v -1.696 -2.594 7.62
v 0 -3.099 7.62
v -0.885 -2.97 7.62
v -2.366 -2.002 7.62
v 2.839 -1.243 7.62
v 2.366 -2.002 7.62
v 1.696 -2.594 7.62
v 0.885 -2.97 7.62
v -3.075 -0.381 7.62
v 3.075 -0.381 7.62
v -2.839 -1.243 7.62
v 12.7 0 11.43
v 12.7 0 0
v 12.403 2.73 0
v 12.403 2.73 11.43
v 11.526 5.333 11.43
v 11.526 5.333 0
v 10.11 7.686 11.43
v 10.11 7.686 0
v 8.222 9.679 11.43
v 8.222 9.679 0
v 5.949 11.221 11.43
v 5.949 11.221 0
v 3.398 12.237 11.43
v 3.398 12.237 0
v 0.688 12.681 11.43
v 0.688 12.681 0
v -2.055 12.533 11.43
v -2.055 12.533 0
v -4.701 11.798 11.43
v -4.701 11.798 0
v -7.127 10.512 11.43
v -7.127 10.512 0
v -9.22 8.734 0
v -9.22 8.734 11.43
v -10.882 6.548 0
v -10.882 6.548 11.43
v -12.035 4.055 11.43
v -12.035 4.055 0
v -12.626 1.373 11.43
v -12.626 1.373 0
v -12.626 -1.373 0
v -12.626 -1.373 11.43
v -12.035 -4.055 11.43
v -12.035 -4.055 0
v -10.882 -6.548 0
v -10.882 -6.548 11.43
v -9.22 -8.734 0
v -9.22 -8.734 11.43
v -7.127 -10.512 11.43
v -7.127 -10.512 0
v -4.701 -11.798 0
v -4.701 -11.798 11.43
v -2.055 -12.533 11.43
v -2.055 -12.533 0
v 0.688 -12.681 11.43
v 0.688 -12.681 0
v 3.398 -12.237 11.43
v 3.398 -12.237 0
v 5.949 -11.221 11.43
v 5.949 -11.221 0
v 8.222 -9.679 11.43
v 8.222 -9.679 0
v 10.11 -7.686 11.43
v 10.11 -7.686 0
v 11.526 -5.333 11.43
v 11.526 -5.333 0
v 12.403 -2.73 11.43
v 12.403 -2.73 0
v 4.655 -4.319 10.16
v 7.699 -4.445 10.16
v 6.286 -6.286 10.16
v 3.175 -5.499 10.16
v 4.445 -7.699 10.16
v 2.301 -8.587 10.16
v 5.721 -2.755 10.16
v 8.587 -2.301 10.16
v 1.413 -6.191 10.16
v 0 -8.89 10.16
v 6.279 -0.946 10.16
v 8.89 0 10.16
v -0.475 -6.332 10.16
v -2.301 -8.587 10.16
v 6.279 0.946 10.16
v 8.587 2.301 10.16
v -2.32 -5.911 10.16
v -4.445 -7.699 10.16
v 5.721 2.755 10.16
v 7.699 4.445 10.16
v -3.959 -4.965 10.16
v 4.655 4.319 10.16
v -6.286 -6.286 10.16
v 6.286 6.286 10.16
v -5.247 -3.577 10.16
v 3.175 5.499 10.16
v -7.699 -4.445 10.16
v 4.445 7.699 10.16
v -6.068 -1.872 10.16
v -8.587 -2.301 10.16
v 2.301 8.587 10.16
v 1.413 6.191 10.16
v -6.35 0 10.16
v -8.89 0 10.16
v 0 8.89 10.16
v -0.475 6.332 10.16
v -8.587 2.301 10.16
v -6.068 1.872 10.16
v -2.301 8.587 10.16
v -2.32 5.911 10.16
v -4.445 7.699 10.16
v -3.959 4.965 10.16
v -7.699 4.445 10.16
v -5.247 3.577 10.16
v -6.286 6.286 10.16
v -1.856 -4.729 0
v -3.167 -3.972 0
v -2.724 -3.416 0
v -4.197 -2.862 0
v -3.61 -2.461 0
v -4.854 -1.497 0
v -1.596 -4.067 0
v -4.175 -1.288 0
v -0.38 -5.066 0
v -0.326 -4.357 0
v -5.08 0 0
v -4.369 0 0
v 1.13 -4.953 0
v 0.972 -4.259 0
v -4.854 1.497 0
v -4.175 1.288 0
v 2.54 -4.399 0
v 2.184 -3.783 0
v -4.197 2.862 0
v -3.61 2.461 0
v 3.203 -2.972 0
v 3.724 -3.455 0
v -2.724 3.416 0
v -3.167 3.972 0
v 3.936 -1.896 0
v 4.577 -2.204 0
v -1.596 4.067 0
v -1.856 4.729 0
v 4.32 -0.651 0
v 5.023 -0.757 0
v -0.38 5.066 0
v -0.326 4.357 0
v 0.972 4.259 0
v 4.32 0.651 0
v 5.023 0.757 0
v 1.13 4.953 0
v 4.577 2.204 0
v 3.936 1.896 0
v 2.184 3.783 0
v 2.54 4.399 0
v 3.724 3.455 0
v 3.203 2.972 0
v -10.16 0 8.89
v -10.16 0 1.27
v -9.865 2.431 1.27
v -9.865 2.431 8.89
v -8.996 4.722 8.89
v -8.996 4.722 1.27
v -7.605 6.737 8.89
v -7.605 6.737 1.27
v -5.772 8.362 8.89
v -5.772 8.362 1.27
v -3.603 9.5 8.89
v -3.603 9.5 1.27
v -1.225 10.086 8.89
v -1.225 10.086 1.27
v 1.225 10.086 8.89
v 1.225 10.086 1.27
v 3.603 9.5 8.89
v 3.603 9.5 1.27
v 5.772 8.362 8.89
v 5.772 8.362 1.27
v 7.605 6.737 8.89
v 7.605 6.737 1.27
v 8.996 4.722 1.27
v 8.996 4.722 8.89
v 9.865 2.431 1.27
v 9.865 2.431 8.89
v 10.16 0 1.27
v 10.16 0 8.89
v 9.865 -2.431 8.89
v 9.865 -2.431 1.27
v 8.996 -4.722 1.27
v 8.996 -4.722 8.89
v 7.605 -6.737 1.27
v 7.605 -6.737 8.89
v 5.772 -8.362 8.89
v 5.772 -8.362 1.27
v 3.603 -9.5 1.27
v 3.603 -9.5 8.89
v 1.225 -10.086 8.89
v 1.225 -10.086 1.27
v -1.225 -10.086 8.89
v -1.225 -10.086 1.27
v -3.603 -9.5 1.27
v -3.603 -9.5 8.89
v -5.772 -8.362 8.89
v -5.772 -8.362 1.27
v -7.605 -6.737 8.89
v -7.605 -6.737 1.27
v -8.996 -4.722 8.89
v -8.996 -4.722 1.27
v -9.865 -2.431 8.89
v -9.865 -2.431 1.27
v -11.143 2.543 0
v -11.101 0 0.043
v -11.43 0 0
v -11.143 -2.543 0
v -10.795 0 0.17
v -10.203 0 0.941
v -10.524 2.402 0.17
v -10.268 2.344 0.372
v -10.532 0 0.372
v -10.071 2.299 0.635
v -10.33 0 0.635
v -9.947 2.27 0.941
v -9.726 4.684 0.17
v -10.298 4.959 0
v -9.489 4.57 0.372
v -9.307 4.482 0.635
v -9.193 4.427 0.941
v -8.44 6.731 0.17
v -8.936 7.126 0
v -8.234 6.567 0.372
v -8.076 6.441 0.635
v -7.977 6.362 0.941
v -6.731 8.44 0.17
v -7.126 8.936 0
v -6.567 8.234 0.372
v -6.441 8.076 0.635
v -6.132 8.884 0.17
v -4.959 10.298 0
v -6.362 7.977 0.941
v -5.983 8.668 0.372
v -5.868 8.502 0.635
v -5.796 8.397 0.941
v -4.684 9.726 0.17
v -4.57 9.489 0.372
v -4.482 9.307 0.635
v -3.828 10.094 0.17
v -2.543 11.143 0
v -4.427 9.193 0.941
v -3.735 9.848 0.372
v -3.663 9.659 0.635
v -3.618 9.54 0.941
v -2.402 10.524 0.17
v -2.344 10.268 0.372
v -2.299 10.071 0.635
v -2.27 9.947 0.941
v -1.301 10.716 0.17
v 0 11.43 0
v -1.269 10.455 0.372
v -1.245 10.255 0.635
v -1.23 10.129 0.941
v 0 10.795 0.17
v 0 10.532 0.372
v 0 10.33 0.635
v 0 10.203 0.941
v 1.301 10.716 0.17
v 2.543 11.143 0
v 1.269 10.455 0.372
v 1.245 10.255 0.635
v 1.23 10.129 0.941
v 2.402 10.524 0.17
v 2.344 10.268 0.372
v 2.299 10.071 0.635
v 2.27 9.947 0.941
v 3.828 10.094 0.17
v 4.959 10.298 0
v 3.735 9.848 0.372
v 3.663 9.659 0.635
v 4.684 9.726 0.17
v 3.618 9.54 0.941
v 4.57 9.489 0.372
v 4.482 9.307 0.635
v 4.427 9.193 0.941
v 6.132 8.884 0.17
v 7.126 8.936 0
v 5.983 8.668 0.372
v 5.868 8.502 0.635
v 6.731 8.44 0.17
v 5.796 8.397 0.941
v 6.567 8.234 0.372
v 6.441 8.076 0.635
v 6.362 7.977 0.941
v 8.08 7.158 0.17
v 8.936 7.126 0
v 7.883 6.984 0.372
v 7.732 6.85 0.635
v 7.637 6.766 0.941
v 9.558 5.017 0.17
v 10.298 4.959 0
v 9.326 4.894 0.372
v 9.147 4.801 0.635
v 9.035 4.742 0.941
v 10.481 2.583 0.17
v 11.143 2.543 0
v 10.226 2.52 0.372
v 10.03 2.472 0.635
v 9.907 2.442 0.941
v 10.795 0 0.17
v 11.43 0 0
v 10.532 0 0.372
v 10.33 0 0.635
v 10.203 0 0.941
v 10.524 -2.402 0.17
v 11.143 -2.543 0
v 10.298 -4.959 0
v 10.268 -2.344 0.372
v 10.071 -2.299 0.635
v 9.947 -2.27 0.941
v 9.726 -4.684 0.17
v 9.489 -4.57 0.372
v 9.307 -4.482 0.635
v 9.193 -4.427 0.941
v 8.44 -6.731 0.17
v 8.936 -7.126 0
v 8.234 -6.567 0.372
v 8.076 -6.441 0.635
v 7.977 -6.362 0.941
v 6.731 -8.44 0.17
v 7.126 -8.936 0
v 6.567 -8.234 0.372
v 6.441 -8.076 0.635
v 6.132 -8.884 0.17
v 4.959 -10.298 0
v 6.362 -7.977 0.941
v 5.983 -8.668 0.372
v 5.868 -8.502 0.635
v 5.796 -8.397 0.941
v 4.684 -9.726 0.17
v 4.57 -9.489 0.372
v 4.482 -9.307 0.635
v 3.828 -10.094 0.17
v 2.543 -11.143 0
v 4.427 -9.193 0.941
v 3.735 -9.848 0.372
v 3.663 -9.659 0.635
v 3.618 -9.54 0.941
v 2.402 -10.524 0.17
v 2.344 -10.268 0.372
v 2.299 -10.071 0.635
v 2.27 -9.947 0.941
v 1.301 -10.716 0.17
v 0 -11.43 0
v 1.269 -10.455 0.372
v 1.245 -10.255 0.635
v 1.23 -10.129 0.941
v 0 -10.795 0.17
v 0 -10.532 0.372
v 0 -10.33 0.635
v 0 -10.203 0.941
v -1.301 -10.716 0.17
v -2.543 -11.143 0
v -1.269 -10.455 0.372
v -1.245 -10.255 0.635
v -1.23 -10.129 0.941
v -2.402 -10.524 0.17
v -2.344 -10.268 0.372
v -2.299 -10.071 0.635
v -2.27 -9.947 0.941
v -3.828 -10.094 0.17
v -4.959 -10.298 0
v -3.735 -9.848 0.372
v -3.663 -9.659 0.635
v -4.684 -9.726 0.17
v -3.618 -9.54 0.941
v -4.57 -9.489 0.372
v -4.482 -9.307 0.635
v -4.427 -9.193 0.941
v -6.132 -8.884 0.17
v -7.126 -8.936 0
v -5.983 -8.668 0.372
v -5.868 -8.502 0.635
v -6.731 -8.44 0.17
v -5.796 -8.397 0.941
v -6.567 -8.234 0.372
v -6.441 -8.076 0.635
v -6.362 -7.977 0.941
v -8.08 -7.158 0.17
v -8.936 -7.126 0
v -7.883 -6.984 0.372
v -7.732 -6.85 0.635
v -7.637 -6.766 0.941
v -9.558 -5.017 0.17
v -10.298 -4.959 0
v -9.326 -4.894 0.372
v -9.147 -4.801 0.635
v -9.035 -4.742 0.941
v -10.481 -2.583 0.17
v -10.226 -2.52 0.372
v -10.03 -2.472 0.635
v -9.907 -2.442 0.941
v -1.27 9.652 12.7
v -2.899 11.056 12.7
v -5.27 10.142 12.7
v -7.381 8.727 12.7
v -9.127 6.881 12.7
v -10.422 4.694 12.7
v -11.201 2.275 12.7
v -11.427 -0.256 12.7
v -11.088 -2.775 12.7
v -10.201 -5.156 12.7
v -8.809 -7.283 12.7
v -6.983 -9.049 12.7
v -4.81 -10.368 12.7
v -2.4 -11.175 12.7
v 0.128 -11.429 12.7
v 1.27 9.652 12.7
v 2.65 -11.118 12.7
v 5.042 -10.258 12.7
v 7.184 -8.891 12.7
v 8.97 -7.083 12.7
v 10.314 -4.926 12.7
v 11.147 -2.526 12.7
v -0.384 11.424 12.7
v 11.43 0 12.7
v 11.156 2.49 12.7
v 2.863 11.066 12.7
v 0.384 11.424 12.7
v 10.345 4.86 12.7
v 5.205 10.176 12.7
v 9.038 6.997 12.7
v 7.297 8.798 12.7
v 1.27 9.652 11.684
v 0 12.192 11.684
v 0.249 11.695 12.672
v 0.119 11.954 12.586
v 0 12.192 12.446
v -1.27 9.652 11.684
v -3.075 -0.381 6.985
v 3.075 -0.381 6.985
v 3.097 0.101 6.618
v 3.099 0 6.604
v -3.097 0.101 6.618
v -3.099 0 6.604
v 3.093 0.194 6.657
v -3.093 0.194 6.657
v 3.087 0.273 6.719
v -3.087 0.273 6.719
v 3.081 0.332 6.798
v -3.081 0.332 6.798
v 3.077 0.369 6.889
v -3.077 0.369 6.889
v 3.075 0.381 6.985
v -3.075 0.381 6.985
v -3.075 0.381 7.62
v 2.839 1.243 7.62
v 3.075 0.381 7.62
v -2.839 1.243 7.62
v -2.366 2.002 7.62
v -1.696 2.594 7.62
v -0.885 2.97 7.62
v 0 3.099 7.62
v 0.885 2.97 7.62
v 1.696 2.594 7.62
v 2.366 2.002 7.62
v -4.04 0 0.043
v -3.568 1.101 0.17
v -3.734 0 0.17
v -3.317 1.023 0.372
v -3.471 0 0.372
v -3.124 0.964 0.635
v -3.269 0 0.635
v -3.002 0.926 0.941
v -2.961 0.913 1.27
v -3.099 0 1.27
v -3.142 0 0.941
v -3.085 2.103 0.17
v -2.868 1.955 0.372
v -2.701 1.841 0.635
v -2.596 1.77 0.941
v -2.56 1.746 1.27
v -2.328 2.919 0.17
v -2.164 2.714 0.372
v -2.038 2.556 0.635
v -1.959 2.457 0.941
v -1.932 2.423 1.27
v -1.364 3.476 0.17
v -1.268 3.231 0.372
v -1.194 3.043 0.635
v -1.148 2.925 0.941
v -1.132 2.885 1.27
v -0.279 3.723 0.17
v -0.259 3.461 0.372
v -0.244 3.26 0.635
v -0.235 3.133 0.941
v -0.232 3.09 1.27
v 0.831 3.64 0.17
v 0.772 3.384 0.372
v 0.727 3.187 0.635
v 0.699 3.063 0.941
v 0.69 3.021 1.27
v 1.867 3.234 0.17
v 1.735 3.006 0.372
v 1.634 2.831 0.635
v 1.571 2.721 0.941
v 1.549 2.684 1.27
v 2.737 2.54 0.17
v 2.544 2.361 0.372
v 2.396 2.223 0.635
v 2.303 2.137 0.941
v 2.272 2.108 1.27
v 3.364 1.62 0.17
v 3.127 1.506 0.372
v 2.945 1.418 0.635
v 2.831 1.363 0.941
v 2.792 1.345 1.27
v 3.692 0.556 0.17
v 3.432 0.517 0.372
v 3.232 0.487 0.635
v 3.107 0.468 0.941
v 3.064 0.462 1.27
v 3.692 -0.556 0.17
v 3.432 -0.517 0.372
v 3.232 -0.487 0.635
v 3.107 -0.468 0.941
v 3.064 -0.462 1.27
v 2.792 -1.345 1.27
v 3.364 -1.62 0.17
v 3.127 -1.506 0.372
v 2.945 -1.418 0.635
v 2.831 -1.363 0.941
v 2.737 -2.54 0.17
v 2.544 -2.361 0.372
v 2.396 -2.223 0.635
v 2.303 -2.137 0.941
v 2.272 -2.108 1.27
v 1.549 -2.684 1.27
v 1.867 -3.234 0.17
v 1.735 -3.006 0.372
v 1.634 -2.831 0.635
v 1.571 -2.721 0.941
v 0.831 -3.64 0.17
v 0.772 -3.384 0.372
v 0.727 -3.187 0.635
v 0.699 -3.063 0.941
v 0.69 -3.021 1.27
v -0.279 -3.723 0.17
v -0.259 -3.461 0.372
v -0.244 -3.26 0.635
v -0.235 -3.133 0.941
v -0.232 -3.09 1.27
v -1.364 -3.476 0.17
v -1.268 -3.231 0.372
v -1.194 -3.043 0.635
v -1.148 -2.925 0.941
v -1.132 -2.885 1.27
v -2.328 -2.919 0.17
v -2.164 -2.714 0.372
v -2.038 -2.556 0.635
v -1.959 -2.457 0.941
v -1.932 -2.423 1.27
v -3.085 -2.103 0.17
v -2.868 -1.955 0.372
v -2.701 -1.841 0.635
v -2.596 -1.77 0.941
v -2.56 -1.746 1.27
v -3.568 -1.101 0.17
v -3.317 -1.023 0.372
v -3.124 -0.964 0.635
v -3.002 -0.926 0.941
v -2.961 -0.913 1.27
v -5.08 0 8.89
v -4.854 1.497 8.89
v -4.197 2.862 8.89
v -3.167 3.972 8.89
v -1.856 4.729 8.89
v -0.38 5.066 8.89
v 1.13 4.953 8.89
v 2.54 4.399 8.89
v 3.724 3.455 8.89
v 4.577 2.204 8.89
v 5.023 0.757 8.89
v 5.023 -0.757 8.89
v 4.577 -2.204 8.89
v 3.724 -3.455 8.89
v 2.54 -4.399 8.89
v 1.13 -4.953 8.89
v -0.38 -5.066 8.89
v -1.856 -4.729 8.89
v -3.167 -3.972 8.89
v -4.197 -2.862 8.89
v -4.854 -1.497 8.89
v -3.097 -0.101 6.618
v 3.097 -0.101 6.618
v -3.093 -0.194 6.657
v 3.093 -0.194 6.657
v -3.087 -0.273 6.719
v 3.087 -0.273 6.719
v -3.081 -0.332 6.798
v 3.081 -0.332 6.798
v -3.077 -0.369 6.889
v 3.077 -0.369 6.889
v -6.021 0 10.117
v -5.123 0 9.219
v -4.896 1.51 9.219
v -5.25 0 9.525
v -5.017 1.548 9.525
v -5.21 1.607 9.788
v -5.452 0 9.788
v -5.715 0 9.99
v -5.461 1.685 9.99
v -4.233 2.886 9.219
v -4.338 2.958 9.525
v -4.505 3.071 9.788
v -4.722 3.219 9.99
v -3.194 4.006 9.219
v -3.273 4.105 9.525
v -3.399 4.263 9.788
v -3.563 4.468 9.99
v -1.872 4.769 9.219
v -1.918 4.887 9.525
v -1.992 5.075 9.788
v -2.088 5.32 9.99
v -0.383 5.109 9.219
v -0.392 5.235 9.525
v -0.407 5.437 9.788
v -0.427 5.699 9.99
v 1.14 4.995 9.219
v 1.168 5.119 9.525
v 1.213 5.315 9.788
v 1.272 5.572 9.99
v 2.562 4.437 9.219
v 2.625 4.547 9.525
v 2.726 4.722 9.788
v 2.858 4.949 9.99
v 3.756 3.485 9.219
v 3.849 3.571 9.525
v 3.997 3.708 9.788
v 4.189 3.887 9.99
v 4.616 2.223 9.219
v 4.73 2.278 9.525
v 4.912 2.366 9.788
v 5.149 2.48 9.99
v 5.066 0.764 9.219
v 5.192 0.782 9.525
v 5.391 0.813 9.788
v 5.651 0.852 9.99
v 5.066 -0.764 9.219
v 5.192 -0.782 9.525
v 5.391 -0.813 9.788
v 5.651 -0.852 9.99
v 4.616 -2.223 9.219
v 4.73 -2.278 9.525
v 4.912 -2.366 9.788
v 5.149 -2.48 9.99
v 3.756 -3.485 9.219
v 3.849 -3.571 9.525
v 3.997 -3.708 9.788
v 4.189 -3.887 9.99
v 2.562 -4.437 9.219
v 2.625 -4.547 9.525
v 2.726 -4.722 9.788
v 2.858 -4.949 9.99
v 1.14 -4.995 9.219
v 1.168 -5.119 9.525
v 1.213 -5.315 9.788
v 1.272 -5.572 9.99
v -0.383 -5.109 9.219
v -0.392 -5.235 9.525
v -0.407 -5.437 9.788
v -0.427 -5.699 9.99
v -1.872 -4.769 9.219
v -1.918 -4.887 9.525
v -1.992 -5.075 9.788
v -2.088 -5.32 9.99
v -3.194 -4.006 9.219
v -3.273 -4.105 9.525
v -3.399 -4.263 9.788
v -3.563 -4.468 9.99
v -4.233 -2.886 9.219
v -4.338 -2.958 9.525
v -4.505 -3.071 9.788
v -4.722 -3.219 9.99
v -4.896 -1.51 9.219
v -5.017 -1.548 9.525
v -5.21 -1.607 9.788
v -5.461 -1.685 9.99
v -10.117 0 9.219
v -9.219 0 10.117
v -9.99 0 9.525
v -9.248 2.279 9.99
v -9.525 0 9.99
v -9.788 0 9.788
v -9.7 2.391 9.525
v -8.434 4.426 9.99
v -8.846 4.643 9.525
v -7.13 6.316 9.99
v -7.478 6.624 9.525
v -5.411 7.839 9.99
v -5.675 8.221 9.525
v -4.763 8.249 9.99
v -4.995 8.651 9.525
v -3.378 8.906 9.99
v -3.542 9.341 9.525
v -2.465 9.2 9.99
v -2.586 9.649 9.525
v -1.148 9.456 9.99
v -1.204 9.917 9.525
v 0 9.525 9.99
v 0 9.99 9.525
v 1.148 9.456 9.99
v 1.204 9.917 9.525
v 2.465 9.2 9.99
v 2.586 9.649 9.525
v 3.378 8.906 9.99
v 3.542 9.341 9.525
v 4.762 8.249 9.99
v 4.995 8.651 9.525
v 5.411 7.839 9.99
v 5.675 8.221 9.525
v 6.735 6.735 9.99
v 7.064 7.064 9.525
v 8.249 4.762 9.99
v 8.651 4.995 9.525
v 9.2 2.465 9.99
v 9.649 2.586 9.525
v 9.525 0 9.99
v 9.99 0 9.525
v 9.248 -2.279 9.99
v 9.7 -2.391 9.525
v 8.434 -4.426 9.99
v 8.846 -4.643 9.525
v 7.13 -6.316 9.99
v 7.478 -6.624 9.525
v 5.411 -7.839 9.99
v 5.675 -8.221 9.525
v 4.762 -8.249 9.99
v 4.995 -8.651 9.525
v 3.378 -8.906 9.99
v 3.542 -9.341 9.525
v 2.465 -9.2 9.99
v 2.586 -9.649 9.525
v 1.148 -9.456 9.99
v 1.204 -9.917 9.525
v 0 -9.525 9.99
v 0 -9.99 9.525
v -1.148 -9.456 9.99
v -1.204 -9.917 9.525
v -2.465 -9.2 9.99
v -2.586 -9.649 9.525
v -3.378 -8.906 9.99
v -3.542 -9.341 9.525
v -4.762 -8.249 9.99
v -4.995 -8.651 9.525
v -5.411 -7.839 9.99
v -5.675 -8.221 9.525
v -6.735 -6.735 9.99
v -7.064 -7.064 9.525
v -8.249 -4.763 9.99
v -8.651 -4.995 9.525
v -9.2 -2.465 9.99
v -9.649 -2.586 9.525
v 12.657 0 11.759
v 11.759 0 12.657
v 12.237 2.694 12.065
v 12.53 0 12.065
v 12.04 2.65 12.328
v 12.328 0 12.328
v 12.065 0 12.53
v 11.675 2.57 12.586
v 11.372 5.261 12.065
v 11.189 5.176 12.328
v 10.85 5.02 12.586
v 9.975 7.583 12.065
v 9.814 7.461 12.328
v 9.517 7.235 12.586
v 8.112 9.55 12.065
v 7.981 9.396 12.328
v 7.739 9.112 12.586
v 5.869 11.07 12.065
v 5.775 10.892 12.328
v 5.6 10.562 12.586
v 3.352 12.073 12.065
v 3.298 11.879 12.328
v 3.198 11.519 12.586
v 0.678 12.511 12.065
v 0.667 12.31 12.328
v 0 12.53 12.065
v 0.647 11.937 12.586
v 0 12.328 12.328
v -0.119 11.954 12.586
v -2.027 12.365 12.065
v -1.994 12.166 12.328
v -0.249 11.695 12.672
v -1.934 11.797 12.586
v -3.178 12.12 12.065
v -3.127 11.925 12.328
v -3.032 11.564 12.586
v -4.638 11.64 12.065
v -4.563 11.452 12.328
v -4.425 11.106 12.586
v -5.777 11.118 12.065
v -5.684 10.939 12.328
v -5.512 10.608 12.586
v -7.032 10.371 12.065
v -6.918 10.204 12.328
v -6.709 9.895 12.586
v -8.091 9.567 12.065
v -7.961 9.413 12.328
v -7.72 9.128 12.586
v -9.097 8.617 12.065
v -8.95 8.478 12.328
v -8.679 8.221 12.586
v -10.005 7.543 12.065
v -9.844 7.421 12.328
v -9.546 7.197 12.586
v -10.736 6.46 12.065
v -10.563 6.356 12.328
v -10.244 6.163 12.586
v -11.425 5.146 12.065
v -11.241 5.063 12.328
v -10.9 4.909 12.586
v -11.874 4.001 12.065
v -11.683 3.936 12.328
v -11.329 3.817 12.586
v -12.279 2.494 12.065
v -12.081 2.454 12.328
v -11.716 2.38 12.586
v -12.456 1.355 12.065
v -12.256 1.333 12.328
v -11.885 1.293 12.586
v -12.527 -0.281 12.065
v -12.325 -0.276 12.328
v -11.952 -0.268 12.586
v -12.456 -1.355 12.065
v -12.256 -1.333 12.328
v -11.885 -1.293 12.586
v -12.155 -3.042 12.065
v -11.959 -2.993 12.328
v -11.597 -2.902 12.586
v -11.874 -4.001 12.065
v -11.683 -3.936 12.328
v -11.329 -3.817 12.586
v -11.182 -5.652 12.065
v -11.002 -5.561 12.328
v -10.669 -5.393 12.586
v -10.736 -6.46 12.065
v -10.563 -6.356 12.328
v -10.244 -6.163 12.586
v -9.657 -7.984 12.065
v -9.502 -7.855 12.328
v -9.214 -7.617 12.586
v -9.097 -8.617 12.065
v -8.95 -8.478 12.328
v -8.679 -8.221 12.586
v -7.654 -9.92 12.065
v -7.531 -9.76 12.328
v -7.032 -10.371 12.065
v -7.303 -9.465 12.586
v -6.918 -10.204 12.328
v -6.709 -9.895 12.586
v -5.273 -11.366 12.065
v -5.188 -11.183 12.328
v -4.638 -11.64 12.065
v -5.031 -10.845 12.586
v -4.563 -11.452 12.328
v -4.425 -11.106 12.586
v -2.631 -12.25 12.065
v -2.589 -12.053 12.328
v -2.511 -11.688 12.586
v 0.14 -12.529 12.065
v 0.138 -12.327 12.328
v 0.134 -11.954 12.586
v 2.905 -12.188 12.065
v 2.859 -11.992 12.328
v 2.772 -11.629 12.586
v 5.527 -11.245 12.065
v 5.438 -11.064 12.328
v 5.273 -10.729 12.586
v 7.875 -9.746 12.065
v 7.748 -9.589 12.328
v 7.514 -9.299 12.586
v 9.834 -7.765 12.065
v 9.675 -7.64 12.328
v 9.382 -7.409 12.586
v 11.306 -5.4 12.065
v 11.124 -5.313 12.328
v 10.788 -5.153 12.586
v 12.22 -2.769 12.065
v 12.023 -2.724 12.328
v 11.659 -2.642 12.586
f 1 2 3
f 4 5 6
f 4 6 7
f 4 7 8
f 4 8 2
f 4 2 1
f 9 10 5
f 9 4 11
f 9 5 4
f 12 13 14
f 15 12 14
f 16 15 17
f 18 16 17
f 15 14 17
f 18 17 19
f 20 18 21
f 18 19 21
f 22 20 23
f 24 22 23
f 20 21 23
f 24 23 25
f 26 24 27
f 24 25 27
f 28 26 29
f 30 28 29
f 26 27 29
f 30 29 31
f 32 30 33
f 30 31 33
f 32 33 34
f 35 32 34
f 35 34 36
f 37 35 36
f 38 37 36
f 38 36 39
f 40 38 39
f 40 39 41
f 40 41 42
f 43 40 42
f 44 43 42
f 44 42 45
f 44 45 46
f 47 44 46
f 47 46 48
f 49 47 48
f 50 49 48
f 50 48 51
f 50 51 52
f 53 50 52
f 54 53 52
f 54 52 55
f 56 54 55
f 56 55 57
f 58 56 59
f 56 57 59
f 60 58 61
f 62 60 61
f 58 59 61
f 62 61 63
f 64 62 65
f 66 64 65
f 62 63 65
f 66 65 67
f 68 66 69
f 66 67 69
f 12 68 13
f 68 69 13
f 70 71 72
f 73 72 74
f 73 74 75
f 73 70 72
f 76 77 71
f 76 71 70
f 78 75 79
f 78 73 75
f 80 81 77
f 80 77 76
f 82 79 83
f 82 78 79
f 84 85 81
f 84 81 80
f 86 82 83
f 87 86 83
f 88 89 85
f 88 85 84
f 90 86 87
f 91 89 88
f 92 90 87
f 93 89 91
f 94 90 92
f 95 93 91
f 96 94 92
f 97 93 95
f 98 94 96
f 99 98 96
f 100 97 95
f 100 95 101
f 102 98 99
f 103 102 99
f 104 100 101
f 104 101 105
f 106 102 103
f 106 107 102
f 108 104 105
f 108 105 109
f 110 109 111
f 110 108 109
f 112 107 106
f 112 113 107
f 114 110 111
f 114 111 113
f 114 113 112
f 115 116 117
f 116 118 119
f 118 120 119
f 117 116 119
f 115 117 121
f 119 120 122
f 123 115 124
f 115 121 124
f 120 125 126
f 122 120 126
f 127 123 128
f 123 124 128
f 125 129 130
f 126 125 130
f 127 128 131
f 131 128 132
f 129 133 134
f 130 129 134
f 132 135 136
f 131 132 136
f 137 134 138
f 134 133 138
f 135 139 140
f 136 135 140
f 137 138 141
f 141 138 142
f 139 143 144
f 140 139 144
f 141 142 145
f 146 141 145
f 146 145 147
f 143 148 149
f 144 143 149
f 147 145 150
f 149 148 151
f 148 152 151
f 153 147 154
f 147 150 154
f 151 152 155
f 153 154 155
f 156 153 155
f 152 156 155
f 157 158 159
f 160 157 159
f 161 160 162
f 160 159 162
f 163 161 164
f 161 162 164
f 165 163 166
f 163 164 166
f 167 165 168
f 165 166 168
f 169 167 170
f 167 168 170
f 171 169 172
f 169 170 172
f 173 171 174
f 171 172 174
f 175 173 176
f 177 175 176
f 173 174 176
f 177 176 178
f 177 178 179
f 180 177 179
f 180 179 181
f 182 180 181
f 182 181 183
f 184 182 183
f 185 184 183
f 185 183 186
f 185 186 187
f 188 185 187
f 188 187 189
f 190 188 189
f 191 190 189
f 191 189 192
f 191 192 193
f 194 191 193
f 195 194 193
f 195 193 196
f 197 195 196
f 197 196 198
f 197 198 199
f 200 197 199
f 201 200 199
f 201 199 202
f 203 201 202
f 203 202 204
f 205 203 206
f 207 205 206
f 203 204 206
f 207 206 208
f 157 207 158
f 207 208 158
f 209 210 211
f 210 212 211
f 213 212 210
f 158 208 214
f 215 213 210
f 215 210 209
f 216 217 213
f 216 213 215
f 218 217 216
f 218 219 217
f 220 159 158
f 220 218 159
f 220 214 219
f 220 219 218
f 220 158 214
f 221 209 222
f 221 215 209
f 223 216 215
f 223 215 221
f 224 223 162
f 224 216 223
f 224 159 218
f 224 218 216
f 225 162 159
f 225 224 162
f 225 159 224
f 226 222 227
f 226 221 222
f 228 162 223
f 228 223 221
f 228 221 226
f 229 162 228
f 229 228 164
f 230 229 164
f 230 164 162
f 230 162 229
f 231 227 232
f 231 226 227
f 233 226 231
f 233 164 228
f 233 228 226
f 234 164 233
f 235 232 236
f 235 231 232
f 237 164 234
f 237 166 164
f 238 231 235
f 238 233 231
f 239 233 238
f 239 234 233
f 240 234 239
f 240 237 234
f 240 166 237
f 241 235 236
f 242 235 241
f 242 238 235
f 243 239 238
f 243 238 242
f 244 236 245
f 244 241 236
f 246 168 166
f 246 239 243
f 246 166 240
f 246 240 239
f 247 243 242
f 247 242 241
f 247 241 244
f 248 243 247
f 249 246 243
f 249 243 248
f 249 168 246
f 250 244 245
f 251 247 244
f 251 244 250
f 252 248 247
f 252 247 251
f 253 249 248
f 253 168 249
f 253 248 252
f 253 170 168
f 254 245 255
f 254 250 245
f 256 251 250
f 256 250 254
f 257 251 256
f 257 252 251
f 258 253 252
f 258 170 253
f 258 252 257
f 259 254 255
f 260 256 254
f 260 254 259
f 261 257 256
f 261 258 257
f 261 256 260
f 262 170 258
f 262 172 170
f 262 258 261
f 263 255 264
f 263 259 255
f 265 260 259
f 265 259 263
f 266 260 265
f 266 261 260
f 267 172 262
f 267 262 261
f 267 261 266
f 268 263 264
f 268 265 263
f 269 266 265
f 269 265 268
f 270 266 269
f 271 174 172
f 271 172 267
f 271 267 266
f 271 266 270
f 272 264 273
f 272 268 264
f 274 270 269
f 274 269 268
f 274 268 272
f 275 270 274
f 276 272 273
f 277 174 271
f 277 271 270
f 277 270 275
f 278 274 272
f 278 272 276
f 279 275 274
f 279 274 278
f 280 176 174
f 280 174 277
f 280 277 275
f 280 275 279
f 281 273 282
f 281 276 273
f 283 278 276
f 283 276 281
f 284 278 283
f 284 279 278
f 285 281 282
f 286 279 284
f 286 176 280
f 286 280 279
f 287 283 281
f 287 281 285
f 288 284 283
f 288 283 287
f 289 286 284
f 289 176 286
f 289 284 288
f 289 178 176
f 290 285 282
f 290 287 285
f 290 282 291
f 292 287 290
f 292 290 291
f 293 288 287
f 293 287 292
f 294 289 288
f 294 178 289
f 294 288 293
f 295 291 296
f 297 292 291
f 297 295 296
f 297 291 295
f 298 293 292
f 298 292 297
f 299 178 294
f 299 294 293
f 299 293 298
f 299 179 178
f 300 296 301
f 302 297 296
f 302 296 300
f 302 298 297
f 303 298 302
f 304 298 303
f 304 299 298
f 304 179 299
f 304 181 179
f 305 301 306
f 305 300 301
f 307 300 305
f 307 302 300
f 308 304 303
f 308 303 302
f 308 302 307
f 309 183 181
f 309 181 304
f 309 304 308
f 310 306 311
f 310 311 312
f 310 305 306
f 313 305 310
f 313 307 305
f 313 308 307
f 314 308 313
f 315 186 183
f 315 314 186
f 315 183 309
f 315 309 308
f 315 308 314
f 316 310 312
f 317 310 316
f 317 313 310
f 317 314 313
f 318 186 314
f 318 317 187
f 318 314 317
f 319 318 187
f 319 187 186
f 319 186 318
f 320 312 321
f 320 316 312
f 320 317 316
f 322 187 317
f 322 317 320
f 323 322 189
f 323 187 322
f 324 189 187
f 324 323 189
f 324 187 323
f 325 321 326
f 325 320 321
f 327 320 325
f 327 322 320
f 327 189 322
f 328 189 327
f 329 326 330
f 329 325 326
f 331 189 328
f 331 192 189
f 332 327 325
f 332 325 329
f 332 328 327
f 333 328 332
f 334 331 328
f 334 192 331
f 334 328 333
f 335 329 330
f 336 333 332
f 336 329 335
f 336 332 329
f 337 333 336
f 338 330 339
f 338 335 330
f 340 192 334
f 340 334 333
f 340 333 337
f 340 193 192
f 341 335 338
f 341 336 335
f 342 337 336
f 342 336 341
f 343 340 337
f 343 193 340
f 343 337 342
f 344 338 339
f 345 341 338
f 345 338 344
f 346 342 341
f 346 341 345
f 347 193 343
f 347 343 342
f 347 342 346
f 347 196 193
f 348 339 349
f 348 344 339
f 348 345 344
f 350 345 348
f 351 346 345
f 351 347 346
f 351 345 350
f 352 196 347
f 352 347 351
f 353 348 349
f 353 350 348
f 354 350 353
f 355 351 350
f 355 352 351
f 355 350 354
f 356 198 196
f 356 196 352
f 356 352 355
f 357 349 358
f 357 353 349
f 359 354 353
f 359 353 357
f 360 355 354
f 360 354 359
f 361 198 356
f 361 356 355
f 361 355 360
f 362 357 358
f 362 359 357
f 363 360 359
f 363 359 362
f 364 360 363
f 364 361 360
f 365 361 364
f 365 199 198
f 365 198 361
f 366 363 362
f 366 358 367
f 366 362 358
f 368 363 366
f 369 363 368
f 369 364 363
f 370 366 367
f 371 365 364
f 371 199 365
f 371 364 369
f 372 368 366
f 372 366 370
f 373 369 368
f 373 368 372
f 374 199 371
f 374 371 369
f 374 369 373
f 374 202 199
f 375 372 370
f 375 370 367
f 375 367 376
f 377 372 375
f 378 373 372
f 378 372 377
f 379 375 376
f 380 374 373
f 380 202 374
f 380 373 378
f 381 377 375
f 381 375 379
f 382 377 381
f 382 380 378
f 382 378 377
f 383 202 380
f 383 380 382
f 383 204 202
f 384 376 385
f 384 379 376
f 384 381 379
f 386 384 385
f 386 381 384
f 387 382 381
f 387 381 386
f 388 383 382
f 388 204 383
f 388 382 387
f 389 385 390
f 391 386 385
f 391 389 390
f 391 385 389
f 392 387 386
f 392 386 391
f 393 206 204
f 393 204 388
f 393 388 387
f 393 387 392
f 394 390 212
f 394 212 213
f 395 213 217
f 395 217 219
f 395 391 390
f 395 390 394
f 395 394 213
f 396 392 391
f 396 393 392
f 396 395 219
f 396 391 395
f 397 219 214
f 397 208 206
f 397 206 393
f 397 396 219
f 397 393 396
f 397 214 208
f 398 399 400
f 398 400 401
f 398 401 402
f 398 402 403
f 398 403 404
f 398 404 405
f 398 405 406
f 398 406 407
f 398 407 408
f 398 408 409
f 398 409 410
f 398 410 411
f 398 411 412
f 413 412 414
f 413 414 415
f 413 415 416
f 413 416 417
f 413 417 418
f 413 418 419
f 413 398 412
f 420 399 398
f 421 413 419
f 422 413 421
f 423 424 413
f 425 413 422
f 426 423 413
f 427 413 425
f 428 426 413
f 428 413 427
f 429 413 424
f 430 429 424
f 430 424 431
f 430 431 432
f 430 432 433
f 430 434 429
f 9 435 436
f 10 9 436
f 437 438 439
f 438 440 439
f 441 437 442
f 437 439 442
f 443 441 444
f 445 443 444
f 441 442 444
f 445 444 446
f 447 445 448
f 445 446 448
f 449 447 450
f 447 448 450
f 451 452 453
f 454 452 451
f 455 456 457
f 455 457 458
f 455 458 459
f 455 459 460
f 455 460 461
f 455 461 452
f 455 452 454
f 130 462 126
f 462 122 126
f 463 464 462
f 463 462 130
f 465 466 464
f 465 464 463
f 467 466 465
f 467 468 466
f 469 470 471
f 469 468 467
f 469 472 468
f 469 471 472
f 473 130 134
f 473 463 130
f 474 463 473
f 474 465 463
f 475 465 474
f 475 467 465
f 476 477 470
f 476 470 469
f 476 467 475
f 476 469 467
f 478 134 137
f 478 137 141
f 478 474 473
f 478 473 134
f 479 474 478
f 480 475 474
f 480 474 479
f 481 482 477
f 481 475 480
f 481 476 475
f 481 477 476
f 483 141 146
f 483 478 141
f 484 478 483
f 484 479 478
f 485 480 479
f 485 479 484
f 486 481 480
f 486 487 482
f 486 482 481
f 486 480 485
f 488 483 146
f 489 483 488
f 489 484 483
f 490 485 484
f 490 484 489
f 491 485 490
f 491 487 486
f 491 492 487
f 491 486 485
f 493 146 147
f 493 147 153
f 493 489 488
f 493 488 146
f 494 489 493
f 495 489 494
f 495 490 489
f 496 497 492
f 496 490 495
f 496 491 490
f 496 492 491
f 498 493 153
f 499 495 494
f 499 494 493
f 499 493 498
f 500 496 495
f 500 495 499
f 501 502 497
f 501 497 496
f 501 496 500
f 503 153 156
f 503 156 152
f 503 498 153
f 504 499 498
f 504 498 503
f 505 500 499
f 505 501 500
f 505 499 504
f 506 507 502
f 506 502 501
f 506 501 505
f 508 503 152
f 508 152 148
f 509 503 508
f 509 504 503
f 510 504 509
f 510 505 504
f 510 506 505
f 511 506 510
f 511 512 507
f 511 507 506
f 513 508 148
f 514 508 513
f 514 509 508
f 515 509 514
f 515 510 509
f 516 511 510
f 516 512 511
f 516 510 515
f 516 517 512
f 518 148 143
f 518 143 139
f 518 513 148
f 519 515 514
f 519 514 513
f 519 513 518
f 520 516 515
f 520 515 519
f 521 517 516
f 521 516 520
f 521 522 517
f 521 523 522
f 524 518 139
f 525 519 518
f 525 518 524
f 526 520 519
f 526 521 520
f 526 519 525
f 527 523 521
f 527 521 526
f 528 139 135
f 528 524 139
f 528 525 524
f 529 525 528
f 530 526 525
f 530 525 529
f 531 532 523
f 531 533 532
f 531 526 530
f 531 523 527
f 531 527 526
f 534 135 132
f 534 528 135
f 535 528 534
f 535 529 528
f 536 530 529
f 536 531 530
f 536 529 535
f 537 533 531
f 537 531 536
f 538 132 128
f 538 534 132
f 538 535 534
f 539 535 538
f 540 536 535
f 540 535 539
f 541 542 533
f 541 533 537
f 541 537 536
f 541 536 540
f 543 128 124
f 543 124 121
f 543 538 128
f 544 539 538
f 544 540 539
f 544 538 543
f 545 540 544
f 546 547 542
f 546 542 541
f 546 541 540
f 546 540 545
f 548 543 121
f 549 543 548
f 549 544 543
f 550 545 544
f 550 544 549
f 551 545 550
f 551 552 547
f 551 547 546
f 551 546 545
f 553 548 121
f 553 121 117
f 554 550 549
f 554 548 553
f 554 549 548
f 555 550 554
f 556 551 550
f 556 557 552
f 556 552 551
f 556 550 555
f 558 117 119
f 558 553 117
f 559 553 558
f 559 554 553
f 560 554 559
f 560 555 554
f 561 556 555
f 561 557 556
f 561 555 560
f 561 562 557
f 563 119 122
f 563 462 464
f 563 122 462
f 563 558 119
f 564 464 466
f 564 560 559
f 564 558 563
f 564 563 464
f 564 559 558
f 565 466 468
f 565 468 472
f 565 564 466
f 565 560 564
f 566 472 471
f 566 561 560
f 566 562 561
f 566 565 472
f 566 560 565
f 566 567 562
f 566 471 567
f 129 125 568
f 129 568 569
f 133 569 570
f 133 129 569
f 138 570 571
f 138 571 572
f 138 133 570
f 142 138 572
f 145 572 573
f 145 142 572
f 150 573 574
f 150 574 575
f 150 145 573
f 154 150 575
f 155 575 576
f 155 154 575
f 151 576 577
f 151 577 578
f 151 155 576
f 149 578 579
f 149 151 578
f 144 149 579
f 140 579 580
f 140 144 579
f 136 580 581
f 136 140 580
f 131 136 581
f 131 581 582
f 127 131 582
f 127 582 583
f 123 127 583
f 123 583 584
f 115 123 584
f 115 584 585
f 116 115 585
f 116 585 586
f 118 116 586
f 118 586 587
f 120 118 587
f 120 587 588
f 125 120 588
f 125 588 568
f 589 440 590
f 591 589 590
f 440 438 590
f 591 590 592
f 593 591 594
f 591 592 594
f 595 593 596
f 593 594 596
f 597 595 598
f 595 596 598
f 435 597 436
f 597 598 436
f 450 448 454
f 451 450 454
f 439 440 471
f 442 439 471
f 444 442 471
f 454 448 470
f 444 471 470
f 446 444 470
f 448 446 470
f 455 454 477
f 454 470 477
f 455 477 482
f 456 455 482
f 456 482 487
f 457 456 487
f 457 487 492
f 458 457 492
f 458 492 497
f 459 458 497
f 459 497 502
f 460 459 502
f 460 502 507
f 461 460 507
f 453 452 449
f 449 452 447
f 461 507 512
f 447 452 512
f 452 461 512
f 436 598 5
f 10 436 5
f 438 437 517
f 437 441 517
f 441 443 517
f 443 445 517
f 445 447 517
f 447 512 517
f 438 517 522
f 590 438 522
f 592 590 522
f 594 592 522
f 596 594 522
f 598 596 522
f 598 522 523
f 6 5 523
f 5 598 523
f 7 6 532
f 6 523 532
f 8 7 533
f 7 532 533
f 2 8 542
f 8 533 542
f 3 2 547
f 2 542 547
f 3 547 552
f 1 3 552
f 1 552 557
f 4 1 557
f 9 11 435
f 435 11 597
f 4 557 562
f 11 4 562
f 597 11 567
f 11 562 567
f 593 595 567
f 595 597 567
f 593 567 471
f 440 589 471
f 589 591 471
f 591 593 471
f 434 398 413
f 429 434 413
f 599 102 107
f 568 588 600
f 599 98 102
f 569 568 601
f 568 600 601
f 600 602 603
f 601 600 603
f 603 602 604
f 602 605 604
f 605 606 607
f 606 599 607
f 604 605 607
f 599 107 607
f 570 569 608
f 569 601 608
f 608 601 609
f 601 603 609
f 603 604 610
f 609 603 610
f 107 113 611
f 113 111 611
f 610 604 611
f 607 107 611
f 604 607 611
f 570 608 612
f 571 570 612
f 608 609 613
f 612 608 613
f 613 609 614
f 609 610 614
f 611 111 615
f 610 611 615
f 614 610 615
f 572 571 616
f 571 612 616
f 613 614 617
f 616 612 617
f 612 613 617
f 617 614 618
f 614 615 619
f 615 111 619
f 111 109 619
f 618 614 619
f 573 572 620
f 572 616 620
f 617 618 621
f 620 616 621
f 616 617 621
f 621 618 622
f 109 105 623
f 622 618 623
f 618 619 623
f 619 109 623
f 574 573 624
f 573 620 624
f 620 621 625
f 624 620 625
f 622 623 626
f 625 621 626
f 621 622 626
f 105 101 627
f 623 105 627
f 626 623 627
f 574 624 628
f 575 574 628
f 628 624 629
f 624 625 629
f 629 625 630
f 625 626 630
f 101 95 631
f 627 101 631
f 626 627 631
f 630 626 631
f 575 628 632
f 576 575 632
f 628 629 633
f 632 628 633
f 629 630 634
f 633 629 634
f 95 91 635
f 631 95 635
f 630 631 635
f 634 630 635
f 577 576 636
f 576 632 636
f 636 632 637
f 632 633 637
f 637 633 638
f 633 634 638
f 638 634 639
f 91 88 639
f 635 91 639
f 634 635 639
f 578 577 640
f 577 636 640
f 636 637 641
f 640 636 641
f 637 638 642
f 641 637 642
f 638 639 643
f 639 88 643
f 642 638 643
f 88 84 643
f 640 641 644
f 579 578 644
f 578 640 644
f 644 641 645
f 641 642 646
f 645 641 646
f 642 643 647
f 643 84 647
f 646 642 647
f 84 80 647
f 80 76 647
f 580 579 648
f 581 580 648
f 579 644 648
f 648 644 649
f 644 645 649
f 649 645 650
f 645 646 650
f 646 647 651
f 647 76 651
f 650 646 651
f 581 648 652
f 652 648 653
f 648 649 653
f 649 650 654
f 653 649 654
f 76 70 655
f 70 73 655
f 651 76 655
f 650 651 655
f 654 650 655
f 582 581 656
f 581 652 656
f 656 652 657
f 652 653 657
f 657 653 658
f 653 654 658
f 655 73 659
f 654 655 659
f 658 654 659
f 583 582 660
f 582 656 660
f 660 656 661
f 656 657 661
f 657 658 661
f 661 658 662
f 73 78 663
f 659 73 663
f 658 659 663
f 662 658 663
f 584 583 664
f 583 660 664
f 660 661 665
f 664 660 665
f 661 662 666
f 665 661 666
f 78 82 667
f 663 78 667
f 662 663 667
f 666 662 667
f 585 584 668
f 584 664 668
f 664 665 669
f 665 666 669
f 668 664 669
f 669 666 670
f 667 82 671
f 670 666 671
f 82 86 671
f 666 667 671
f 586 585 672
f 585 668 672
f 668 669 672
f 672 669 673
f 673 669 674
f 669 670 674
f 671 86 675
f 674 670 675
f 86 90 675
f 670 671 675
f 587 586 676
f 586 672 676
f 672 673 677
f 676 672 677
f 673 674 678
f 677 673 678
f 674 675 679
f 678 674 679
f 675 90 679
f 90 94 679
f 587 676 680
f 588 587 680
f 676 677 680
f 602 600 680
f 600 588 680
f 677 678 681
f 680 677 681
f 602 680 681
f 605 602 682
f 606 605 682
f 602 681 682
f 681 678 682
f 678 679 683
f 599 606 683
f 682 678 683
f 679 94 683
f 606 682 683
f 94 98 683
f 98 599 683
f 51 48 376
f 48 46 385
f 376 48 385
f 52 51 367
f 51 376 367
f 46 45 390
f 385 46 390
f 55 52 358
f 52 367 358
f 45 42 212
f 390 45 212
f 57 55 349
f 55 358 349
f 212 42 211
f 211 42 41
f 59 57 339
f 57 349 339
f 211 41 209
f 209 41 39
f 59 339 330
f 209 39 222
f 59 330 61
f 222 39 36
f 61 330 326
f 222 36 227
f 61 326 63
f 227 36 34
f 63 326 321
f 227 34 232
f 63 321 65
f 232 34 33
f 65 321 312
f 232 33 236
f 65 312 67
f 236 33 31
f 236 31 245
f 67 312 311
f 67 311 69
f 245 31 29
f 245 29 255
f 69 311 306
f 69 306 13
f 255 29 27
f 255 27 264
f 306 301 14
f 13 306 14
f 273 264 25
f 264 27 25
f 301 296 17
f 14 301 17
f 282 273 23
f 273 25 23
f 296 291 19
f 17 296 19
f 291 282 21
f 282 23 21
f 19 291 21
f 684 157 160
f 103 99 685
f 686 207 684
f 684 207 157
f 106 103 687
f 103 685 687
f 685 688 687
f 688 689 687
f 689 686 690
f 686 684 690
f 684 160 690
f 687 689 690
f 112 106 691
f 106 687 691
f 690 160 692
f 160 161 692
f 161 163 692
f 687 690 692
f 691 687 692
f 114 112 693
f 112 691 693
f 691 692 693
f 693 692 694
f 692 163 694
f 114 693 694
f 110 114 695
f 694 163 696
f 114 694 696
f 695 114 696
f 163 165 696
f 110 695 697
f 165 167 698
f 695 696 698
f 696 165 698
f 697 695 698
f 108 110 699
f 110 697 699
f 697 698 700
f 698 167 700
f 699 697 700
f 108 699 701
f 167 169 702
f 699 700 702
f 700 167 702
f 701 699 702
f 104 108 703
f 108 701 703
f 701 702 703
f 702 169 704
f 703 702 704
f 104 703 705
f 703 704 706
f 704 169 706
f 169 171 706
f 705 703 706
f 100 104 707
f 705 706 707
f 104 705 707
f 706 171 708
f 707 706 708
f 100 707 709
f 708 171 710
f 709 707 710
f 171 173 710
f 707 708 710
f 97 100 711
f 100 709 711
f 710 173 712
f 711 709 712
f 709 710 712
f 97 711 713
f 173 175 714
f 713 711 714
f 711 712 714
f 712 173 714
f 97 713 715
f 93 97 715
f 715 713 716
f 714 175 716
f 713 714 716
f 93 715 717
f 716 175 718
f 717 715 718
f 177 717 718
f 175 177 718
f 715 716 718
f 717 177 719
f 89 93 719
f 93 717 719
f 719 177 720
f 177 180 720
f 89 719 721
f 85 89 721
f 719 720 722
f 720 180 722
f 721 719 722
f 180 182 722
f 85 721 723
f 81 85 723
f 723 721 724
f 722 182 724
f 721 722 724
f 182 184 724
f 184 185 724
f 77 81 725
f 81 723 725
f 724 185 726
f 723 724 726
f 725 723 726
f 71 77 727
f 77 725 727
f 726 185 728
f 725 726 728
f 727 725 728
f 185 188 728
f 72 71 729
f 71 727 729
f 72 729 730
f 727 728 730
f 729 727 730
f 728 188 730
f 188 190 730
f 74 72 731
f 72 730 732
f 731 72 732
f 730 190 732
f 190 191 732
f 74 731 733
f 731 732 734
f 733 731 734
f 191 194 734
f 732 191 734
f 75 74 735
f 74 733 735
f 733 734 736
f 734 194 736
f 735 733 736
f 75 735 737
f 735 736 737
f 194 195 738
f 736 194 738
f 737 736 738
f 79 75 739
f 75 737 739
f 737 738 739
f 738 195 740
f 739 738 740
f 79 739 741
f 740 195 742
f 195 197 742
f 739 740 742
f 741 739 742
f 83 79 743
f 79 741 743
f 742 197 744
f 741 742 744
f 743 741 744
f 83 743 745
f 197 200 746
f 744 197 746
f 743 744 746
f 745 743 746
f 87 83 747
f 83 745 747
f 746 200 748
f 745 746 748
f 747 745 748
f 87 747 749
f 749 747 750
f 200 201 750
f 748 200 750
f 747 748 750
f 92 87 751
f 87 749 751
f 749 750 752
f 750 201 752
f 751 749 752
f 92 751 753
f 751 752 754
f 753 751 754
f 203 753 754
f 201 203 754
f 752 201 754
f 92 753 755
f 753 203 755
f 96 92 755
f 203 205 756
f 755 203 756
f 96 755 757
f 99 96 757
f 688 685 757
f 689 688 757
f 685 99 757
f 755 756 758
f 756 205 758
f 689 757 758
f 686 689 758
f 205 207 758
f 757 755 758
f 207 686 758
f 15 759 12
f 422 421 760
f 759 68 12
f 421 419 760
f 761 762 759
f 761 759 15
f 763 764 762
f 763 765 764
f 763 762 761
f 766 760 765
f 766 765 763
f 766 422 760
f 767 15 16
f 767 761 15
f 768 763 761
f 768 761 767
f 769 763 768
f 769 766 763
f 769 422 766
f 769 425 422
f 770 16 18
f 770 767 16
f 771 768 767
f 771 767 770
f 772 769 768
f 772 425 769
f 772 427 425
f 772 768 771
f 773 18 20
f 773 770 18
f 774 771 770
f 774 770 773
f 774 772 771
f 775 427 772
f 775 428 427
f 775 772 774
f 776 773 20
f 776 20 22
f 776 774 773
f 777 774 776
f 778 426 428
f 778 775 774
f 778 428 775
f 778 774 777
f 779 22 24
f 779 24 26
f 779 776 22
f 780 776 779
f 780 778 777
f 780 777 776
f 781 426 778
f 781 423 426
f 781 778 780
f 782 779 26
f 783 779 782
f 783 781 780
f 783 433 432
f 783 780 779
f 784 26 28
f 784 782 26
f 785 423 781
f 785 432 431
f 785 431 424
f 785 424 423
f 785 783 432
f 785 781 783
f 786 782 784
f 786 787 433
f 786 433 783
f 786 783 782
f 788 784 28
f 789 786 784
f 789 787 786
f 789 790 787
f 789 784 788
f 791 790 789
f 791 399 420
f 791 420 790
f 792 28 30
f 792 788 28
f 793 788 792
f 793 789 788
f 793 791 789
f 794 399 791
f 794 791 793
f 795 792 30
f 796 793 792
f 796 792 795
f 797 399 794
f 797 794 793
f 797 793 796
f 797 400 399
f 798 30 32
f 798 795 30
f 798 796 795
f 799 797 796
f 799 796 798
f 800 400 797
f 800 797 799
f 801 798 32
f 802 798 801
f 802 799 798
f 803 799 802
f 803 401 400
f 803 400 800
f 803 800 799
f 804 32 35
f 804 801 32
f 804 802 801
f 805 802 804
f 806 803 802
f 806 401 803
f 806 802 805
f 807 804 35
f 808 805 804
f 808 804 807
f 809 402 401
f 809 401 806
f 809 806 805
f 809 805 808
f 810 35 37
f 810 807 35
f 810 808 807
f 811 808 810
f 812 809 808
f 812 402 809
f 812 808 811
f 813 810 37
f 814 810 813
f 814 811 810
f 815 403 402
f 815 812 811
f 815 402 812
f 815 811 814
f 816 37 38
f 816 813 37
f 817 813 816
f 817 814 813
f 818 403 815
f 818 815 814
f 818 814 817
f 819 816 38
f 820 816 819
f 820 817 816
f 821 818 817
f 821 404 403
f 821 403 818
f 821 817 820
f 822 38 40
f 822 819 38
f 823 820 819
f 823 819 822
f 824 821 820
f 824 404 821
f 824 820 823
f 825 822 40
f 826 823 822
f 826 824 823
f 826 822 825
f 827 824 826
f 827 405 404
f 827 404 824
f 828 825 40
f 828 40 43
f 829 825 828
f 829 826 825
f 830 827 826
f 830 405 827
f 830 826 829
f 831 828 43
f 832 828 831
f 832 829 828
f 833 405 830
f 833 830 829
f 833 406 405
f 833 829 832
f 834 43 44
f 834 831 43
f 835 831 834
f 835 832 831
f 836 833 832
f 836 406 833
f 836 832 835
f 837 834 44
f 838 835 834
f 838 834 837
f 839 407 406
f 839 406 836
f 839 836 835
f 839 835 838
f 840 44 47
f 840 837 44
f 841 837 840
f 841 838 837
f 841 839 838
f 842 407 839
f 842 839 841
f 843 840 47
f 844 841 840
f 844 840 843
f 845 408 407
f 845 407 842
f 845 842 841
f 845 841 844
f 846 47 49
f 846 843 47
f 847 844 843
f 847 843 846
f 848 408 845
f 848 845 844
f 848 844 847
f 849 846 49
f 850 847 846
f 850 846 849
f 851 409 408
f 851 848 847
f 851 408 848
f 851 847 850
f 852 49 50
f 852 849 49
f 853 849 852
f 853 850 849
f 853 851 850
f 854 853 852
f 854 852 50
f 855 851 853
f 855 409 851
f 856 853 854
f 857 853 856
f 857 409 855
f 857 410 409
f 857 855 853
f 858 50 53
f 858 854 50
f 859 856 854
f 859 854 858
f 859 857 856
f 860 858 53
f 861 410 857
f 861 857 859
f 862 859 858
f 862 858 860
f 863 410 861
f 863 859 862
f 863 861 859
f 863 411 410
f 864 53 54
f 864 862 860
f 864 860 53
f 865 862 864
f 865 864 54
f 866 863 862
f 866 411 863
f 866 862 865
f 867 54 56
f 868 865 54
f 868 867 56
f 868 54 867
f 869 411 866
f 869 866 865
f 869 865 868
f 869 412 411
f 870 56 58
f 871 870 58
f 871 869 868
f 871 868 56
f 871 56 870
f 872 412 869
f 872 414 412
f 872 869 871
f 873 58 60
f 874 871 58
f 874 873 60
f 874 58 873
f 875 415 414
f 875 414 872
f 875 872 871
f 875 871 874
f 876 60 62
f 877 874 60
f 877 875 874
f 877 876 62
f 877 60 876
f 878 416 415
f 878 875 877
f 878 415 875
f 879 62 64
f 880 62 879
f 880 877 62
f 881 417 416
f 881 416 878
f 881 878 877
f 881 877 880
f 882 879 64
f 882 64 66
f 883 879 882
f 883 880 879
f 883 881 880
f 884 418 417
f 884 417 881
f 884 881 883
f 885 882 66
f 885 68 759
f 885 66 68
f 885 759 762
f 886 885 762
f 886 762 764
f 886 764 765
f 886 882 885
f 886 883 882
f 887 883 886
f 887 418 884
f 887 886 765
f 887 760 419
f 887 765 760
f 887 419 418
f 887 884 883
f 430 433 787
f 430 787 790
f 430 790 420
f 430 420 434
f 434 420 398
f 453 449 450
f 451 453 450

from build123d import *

# Parameters (mm, degrees)
SKETCH1_R           = 12.7
BOSS_EXTRUDE1_DEPTH = 12.7
SKETCH2_R           = 3.0988
CUT_EXTRUDE1_DEPTH  = 7.62
BOSS_EXTRUDE3_START = 1.016
BOSS_EXTRUDE3_DEPTH = 1.016
SKETCH4_R           = 10.16
SKETCH4_R_2         = 5.08
CUT_EXTRUDE2_DEPTH  = 10.16
CUT_EXTRUDE3_DEPTH  = 1.016
FILLET1_R           = 1.27
FILLET2_R           = 0.381


# Some blends are built 0.0001 mm under size
with BuildPart() as part:
    # Sketch1 → Boss-Extrude1 (new body)
    with BuildSketch(Plane.XY):
        Circle(SKETCH1_R)
    extrude(amount=BOSS_EXTRUDE1_DEPTH)

    # Sketch2 → Cut-Extrude1 (cut)
    with BuildSketch(Plane(origin=(0, 0, 0), x_dir=(-1, 0, 0), z_dir=(0, 0, -1))):
        Circle(SKETCH2_R)
    extrude(amount=-CUT_EXTRUDE1_DEPTH, mode=Mode.SUBTRACT)

    # Sketch3 → Boss-Extrude3 (add)
    with BuildSketch(Plane(origin=(0, 0, 7.62), x_dir=(-1, 0, 0), z_dir=(0, 0, -1)).offset(BOSS_EXTRUDE3_START)):
        with BuildLine():
            Line((-3.075288676, 0.381), (3.075288676, 0.381))
            ThreePointArc((3.075288676, 0.381), (3.0988, 0), (3.075288676, -0.381))
            Line((3.075288676, -0.381), (-3.075288676, -0.381))
            ThreePointArc((-3.075288676, -0.381), (-3.0988, 0), (-3.075288676, 0.381))
        make_face()
    extrude(amount=-BOSS_EXTRUDE3_DEPTH)

    # Sketch4 → Cut-Extrude2 (cut)
    with BuildSketch(Plane(origin=(0, 0, 0), x_dir=(-1, 0, 0), z_dir=(0, 0, -1))):
        Circle(SKETCH4_R)
        Circle(SKETCH4_R_2, mode=Mode.SUBTRACT)
    extrude(amount=-CUT_EXTRUDE2_DEPTH, mode=Mode.SUBTRACT)

    # Sketch5 → Cut-Extrude3 (cut)
    with BuildSketch(Plane.XY.offset(12.7)):
        Polygon((0, 12.192), (-1.27, 9.652), (1.27, 9.652), align=None)
    extrude(amount=-CUT_EXTRUDE3_DEPTH, mode=Mode.SUBTRACT)

    # Fillet1
    # the kernel refuses this fillet: 1.27 mm, written as the material it adds along each edge
    with BuildSketch(Plane(origin=(0, 0, 10.16), x_dir=(-1, 0, 0), z_dir=(0, -1, 0))) as fillet1_piece_1:
        with BuildLine():
            CenterArc((10.16 - FILLET1_R, FILLET1_R), FILLET1_R, 270, 90)
            Line((10.16 - FILLET1_R, 0), (10.16, 0))
            Line((10.16, 0), (10.16, FILLET1_R))
        make_face()
    revolve(axis=Axis((0, 0, 10.16), (0, 0, -1)))
    with BuildSketch(Plane(origin=(0, 0, 10.16), x_dir=(-1, 0, 0), z_dir=(0, -1, 0))) as fillet1_piece_2:
        with BuildLine():
            CenterArc((5.08 + FILLET1_R, FILLET1_R), FILLET1_R, 180, 90)
            Line((5.08, FILLET1_R), (5.08, 0))
            Line((5.08, 0), (5.08 + FILLET1_R, 0))
        make_face()
    revolve(axis=Axis((0, 0, 10.16), (0, 0, -1)))
    # the kernel refuses this fillet: 1.27 mm, written as the material it takes off along each edge
    with BuildSketch(Plane(origin=(0, 0, 0), x_dir=(-1, 0, 0), z_dir=(0, -1, 0))) as fillet1_2_piece_1:
        with BuildLine():
            CenterArc((10.16 + FILLET1_R, -FILLET1_R), FILLET1_R, 90, 90)
            Line((10.16, -FILLET1_R), (10.16, 0))
            Line((10.16, 0), (10.16 + FILLET1_R, 0))
        make_face()
    revolve(axis=Axis((0, 0, 0), (0, 0, -1)), mode=Mode.SUBTRACT)
    with BuildSketch(Plane(origin=(0, 0, 12.7), x_dir=(1, 0, 0), z_dir=(0, -1, 0))) as fillet1_2_piece_2:
        with BuildLine():
            CenterArc((12.7 - FILLET1_R, -FILLET1_R), FILLET1_R, 0, 90)
            Line((12.7 - FILLET1_R, 0), (12.7, 0))
            Line((12.7, 0), (12.7, -FILLET1_R))
        make_face()
    revolve(axis=Axis((0, 0, 12.7), (0, 0, 1)), mode=Mode.SUBTRACT)
    with BuildSketch(Plane(origin=(0, 0, 0), x_dir=(-1, 0, 0), z_dir=(0, -1, 0))) as fillet1_2_piece_3:
        with BuildLine():
            CenterArc((3.0988 + FILLET1_R, -FILLET1_R), FILLET1_R, 90, 90)
            Line((3.0988, -FILLET1_R), (3.0988, 0))
            Line((3.0988, 0), (3.0988 + FILLET1_R, 0))
        make_face()
    revolve(axis=Axis((0, 0, 0), (0, 0, -1)), mode=Mode.SUBTRACT)

    # Fillet2
    fillet2_edges = [part.edges().sort_by_distance(p)[0] for p in [
        (0, 0.381, 6.604),
        (0, -0.381, 6.604),
    ]]
    fillet(fillet2_edges, radius=FILLET2_R - 0.0001)  # a hair under: the kernel refuses the full size


solid = part.part
